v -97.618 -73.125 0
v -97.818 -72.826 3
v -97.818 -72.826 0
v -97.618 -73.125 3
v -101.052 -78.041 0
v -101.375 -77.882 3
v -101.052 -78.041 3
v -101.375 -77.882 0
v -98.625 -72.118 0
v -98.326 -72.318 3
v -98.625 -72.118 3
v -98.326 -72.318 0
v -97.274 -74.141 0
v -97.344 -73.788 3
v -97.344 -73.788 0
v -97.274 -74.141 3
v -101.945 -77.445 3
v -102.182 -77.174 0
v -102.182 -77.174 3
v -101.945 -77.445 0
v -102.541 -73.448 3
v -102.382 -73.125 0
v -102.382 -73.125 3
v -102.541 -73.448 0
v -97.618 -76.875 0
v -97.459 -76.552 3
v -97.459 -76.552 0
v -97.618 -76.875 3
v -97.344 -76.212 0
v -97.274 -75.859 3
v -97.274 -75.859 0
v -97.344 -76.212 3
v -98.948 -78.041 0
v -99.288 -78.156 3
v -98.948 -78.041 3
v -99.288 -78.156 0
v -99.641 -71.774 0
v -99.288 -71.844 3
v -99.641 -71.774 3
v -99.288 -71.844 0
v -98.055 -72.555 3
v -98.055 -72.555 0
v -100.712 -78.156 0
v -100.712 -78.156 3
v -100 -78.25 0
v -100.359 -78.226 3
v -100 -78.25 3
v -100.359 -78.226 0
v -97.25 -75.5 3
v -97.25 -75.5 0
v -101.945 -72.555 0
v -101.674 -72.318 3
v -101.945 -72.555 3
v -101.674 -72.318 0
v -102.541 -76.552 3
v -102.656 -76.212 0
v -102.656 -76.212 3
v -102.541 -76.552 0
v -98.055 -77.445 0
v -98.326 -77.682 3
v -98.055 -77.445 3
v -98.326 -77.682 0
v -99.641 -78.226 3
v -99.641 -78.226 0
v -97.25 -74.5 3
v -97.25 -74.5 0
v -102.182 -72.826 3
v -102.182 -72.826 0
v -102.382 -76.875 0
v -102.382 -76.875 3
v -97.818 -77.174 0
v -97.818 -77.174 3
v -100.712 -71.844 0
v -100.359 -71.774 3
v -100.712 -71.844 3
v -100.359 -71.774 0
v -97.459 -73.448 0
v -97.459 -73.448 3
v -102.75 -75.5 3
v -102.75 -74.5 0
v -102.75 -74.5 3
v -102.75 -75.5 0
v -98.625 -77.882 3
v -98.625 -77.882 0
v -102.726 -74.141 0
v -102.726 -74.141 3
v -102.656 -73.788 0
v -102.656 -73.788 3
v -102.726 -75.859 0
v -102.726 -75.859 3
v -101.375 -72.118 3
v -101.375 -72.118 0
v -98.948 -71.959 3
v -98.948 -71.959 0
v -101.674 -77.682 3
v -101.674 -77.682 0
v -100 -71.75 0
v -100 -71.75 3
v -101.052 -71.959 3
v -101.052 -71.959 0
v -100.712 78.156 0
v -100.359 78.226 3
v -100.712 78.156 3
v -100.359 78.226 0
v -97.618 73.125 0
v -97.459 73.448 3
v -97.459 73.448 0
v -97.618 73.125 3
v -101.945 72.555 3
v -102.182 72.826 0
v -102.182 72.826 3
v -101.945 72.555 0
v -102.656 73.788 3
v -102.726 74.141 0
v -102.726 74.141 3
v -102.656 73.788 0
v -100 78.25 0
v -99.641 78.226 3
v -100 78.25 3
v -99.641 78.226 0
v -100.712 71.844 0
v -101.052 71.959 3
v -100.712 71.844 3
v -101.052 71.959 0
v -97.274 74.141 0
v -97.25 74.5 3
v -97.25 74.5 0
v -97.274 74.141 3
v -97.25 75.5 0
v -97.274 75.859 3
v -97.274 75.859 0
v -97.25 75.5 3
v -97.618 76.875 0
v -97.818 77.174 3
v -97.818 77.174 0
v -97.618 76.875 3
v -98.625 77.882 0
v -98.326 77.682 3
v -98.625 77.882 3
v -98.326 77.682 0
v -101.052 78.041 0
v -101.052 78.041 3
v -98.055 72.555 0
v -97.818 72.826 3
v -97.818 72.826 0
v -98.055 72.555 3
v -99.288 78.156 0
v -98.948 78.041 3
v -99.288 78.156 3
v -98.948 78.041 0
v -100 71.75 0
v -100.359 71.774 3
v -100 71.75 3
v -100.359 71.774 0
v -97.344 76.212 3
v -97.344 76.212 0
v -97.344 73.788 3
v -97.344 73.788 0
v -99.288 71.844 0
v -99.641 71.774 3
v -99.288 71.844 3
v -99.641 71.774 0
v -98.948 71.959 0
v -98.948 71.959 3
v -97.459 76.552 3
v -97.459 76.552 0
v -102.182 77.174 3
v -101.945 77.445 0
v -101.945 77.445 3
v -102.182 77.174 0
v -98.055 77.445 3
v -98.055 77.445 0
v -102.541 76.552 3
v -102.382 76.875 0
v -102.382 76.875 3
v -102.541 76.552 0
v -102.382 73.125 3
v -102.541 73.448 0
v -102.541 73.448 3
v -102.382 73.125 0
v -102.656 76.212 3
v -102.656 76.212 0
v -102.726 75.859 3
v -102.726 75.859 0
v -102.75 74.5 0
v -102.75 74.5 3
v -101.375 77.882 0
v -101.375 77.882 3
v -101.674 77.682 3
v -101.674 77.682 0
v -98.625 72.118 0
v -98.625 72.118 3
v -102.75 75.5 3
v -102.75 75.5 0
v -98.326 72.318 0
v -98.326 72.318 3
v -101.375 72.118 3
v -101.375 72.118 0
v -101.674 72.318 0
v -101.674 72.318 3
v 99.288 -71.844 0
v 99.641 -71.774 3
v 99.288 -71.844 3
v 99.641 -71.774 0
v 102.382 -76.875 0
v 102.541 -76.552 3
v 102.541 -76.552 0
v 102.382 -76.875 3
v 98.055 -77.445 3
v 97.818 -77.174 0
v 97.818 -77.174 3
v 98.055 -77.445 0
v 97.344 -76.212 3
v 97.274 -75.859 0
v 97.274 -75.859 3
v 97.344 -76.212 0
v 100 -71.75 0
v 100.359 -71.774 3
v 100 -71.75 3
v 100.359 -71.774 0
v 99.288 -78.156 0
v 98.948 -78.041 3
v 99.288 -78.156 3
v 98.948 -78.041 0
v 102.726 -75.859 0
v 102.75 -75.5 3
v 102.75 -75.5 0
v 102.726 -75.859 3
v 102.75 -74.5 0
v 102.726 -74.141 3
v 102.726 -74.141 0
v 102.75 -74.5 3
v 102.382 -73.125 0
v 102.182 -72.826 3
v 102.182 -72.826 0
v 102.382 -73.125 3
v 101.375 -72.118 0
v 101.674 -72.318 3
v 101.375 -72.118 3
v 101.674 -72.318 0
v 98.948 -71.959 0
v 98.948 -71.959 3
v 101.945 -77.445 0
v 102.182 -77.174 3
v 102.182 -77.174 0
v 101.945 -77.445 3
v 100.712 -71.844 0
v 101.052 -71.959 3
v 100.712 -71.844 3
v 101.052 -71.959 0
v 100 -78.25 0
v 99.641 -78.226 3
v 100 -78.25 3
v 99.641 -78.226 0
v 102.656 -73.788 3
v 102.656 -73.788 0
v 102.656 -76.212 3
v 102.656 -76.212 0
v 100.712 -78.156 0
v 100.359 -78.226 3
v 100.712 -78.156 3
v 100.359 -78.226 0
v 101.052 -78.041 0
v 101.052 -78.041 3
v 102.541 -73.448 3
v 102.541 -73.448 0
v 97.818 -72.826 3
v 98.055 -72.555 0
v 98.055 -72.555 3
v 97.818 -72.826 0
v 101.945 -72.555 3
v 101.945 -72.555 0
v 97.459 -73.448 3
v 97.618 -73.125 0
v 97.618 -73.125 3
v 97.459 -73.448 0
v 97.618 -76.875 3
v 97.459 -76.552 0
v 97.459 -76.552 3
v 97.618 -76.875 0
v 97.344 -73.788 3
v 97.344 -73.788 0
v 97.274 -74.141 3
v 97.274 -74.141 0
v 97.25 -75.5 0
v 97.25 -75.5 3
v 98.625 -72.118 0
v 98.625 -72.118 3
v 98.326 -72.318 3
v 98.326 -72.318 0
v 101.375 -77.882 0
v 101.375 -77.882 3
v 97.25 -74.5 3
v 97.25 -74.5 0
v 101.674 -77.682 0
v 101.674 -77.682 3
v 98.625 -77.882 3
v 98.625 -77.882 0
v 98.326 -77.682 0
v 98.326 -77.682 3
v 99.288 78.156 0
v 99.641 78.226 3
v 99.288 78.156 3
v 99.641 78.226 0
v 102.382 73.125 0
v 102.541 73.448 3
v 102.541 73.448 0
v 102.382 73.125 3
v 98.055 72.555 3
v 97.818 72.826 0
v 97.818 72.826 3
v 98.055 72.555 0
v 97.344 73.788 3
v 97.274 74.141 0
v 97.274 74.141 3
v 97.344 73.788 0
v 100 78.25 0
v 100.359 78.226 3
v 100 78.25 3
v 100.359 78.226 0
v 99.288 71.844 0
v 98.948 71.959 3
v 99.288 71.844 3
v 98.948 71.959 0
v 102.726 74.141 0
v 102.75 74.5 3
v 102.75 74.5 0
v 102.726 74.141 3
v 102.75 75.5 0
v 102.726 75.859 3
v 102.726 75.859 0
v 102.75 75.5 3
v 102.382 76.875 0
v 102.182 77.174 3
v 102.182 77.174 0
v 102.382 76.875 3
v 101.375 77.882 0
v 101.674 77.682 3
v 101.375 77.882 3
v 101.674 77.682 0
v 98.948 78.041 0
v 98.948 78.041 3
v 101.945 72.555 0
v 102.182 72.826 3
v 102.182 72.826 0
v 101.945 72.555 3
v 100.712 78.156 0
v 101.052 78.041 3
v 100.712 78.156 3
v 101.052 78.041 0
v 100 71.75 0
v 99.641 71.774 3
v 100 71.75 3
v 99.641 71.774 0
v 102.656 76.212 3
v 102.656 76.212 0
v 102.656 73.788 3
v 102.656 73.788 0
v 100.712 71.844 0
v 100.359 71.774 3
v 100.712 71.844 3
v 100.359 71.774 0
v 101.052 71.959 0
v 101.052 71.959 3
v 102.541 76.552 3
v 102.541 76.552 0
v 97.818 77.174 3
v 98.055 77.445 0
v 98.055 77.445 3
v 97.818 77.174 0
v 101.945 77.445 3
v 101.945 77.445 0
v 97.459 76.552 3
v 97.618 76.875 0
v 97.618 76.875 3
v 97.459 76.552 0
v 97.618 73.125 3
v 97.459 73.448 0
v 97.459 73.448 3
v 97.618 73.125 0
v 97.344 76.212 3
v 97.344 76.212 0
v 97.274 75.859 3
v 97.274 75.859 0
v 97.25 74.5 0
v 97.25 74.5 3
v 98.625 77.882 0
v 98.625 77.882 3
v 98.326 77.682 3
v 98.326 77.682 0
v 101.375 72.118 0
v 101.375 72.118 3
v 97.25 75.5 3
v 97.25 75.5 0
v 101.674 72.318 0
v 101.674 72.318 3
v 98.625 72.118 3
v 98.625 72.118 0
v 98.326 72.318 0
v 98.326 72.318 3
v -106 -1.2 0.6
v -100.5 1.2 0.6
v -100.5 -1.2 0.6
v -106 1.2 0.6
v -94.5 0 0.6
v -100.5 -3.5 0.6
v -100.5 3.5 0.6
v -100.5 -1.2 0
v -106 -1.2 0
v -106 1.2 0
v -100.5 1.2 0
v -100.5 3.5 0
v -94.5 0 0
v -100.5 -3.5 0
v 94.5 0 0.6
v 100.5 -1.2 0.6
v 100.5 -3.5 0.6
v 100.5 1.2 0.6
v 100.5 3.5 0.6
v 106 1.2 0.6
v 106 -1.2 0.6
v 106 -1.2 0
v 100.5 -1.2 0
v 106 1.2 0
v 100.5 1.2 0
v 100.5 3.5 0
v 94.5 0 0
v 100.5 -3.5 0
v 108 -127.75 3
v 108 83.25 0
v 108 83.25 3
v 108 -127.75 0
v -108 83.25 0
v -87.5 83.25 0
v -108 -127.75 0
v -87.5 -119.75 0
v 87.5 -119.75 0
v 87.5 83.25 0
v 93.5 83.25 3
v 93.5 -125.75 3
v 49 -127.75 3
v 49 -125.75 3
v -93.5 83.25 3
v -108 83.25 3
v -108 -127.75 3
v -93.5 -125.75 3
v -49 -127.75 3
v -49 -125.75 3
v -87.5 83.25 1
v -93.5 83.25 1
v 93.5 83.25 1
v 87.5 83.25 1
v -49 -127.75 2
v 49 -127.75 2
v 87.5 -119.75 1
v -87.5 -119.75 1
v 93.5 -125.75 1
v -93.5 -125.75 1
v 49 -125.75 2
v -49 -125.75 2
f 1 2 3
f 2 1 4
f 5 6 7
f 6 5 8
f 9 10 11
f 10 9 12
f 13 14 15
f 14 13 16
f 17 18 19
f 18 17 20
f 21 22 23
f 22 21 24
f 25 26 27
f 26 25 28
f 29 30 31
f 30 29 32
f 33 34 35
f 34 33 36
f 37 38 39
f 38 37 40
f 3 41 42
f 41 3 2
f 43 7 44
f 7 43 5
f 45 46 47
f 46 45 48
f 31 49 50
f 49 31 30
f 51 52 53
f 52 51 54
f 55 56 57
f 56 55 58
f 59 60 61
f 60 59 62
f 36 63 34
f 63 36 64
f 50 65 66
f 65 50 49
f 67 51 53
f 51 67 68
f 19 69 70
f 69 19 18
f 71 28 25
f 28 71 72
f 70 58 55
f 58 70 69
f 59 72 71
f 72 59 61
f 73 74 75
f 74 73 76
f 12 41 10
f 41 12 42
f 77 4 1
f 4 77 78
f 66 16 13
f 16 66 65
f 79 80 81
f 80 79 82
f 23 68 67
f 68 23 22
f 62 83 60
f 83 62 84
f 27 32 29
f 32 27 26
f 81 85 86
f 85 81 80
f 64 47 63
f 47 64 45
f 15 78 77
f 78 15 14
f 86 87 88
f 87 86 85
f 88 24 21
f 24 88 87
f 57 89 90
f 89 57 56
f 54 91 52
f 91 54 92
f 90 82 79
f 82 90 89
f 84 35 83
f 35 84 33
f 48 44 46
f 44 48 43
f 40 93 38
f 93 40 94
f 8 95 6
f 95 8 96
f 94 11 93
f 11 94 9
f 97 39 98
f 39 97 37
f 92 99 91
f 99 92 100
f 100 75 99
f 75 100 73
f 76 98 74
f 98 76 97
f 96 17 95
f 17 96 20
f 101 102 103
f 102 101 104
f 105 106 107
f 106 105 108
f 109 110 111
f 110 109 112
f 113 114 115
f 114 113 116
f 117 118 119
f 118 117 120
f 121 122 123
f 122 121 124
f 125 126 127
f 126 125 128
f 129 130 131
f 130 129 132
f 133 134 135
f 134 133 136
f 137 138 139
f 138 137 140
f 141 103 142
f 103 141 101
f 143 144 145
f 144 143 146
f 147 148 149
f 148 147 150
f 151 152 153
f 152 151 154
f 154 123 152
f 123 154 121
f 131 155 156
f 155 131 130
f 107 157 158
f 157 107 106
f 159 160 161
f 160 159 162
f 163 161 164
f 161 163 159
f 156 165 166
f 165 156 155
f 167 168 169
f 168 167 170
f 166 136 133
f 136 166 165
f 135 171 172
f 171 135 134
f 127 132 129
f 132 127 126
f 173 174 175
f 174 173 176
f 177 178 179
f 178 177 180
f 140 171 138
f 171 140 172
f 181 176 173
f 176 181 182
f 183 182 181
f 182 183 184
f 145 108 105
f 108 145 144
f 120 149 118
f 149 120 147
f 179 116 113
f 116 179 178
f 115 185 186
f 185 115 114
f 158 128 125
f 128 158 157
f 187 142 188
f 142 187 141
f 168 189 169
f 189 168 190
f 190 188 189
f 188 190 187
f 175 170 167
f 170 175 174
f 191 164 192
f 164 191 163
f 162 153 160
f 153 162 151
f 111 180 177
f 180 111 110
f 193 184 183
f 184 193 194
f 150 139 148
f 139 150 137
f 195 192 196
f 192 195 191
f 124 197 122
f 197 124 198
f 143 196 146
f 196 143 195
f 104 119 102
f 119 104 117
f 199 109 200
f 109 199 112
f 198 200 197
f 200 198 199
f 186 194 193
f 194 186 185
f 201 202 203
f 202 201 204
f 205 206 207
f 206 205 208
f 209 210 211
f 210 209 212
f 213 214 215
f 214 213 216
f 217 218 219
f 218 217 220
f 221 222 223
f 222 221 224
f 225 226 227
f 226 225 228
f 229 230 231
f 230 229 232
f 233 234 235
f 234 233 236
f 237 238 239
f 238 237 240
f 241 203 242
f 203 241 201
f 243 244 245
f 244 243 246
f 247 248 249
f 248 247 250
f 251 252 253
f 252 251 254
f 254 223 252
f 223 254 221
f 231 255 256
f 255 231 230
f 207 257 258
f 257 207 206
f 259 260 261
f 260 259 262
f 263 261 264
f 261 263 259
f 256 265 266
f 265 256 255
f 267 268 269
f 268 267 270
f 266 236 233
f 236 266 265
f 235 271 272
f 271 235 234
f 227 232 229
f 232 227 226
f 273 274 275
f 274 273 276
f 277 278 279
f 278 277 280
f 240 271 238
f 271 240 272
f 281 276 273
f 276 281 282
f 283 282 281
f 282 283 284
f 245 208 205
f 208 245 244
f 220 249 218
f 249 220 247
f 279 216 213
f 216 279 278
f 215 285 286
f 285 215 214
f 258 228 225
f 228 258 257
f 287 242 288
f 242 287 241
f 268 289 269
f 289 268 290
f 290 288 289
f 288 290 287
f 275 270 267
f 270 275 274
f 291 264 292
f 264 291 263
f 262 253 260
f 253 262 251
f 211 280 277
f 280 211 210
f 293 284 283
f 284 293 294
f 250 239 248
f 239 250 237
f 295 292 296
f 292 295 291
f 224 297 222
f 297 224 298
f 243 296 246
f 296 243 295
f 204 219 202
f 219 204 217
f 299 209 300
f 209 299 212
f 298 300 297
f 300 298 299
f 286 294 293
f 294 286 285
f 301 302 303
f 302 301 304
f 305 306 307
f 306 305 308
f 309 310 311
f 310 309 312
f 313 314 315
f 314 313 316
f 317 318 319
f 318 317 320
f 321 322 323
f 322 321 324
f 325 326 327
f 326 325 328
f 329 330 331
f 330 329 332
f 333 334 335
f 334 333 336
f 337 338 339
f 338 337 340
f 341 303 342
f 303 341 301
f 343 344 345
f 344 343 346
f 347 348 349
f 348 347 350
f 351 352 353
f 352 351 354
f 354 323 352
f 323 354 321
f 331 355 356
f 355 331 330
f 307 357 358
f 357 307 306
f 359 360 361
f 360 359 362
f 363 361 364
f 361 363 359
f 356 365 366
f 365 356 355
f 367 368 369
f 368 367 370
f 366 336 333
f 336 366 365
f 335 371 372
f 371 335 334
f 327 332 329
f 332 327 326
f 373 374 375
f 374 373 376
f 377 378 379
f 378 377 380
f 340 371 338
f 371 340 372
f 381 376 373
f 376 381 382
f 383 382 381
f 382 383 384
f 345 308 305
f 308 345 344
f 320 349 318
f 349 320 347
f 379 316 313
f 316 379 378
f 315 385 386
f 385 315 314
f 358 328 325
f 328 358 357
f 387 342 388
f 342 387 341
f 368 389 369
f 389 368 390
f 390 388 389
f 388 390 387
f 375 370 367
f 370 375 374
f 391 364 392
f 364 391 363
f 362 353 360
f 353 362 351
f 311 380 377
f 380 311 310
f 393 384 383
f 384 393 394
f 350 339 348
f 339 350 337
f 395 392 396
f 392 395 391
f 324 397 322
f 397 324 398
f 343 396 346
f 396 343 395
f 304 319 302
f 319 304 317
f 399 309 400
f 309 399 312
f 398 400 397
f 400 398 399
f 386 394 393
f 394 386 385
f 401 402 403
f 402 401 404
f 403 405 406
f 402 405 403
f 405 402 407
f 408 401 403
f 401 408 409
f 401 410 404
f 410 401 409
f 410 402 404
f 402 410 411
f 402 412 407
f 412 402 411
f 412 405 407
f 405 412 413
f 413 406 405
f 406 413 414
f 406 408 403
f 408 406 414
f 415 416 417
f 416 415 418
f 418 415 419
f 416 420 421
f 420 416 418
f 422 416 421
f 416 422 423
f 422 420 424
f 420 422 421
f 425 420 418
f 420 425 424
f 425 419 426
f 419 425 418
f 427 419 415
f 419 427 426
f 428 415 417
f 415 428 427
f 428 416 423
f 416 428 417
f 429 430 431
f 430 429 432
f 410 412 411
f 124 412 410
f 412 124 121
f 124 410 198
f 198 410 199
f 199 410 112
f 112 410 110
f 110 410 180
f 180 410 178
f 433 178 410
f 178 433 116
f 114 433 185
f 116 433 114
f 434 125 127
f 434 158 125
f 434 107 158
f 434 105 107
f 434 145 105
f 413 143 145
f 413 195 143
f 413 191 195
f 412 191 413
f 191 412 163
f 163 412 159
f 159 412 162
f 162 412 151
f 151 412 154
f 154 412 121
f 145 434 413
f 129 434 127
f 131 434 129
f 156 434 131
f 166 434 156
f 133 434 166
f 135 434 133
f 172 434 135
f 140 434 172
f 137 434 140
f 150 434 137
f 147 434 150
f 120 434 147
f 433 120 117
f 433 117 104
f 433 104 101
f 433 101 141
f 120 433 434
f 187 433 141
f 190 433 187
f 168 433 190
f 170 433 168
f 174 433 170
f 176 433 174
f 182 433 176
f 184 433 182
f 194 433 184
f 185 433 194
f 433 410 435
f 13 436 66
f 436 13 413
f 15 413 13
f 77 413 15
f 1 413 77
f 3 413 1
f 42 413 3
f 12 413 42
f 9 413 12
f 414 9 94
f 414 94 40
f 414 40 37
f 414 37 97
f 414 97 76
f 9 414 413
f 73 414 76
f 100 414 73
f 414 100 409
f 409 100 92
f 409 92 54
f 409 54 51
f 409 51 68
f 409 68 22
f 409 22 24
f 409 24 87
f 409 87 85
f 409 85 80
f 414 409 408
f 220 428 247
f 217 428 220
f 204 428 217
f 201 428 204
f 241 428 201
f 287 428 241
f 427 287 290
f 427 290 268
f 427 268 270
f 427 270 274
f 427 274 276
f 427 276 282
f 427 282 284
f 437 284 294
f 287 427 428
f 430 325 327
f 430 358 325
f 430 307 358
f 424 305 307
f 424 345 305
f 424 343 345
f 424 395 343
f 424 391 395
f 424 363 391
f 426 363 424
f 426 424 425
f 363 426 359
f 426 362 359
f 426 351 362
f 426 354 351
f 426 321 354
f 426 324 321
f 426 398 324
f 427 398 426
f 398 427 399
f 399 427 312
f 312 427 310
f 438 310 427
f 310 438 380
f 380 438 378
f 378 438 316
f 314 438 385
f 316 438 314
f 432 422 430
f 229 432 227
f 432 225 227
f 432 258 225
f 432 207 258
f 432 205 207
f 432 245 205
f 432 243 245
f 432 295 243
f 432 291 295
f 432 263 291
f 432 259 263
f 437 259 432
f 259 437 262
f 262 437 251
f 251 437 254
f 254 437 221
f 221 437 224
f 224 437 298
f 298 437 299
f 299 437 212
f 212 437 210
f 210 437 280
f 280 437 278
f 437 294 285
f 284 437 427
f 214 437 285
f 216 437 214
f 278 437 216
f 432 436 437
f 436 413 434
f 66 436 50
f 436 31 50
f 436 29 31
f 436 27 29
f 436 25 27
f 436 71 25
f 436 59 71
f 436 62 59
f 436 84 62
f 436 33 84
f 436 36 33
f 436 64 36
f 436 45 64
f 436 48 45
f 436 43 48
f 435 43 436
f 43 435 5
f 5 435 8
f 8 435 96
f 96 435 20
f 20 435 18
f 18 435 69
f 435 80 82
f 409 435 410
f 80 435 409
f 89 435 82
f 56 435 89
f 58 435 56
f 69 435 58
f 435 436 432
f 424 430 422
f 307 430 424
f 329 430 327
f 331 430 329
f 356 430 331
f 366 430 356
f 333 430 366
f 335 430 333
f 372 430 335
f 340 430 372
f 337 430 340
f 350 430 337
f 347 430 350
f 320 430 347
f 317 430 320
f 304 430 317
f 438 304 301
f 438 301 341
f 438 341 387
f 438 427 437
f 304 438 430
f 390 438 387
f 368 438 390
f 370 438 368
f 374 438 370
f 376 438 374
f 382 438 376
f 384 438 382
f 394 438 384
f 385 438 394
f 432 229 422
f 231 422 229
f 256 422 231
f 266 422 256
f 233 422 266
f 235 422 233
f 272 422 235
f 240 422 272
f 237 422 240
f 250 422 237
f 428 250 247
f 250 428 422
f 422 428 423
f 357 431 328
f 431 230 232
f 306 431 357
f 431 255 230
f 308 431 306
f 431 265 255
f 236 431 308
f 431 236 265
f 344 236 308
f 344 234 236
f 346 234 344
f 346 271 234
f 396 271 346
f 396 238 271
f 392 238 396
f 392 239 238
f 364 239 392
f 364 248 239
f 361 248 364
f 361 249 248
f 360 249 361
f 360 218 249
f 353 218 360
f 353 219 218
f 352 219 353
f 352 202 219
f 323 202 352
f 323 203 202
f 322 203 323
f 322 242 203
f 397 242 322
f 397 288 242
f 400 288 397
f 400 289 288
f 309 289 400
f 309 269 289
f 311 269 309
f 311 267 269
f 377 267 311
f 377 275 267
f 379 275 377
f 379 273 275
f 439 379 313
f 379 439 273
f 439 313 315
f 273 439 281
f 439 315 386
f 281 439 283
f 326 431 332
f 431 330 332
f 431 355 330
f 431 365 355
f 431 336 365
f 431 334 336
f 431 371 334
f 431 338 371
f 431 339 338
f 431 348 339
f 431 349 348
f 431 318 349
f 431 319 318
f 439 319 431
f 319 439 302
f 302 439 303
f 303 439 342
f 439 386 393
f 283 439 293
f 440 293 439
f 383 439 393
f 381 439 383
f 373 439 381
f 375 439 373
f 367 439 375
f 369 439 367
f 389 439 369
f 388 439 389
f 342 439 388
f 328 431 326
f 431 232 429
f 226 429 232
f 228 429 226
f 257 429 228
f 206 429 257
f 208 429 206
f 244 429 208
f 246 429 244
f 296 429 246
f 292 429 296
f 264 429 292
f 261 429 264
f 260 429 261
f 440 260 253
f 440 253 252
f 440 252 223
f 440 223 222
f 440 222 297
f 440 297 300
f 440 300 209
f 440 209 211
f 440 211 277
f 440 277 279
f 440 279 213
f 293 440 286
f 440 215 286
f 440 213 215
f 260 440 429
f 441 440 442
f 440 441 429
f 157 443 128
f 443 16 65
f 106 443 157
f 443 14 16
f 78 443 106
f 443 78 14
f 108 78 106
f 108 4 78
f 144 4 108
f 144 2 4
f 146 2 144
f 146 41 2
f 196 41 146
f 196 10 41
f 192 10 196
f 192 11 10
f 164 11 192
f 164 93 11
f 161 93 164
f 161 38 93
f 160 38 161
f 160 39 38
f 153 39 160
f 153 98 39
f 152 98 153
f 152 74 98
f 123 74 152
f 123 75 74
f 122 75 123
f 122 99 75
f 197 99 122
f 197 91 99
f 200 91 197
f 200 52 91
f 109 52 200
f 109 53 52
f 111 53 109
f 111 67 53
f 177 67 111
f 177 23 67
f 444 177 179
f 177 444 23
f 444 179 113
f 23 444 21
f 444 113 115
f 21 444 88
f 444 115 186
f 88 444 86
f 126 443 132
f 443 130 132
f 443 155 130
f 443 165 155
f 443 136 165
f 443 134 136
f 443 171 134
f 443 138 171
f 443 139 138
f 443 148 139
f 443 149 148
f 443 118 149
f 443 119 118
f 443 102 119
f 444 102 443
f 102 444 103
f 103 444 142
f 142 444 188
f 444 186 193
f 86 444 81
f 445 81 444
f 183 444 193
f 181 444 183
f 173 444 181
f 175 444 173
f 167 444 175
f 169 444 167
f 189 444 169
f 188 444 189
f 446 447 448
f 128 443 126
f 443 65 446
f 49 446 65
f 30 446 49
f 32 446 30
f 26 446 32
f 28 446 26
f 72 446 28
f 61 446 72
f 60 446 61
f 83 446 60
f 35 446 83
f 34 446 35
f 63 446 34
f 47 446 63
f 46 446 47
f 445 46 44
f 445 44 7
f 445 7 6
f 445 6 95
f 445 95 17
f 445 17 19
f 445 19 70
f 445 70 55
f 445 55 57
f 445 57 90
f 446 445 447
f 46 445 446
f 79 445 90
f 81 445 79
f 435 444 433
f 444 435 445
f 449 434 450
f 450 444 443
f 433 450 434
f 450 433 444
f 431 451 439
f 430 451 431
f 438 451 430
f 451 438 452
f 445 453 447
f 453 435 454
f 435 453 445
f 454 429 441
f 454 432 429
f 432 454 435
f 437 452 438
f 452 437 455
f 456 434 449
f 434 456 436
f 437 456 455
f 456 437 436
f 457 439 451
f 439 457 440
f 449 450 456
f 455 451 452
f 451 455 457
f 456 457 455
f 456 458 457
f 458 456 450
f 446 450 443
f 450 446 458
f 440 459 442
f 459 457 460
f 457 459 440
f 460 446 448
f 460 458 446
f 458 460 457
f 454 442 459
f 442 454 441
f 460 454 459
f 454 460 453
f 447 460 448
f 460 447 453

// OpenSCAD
// freETarget rifle mask holder for a 185 x 229 mm (7.25" x 9") paper mask.
// The mask's 30.5 mm hole sits concentric with the faceplate hole; the witness paper
// runs top to bottom between the mask and the faceplate and leaves under the crossbar.
// The legs stop just above the top screws, so a mask can be fed in from the top.
// Mounts on the faceplate's 4 screws (Rifle Face Plate.dxf / FET-016: dia 5 mm holes at
// x = +-100, y = +74.5 / -75.5 from the hole centre). Pocket and notch copy
// "Rifle Target Holder v17": 3 mm thick, 2 mm pocket, 98 x 1 mm witness-paper notch.
// Two arrows recessed in the front face mark the horizontal centre line of the mask hole.
//
// Axes: origin = faceplate hole centre, X right, Y up (crossbar at the bottom),
//       Z = 0 on the back face (against the faceplate), Z = T on the front.
// Build the STLs with ../build-stls.sh.

PIECE        = "whole";   // "whole" (one piece), "bar", "left", "right", "assembly"
PRINT_LAYOUT = true;      // front face down on the bed

// ---- paper mask ----
PAPER_W  = 185;
PAPER_H  = 229;
HOLE_D   = 30.5;
HOLE_TOP = 89;                       // top of the mask hole, from the top of the paper
AIM_FROM_TOP = HOLE_TOP + HOLE_D/2;  // 104.25

// ---- pocket and notch (same as Rifle Target Holder v17) ----
T         = 3;      // overall thickness
POCKET_D  = 2;      // mask + witness paper pocket, from the back
PAPER_CLR = 1;      // pocket clearance around the mask, each side
NOTCH_W   = 98;     // witness-paper notch under the crossbar
NOTCH_D   = 1;

// ---- frame ----
LIP        = 5;     // frame overlaps the mask edge by this much (sides and bottom)
BAR_BELOW  = 2;     // full-thickness strip below the pocket (was 12; 10 mm removed so the
                    // crossbar clears the paper-feed frame)
HEAD_D     = 9.5;   // screw head diameter (M5 pan head, 3 mm hex socket)
TOP_EDGE   = 3;     // plastic left above the screw head; the legs stop here so a mask can be
                    // fed in from the top past the target's paper guide (the mask top is not held)
OUTER_X    = 108;   // half width

// ---- faceplate screws ----
BOLT_X    = 100;
BOLT_Y    = 75;     // slot centre; the 1 mm slot covers +74.5 / -75.5 either way up
BOLT_SLOT = 1;
BOLT_D    = 5.5;    // M5 clearance (3 mm hex socket pan heads); was 5.0

// ---- centre-line arrows (front face) ----
ARROW_DEPTH = 0.6;  // recessed: 3 layers at 0.2 mm
ARROW_TIP   = 1;    // tip this far outside the pocket edge (full-thickness part of the leg)
ARROW_HEAD_L = 6;
ARROW_HEAD_W = 7;
ARROW_TAIL_L = 5.5;
ARROW_TAIL_W = 2.4;

// ---- split version ----
SPLIT_Y  = -60;     // legs and crossbar part here, between the screws
DT_NECK  = 4.5;     // dovetail neck width
DT_HEAD  = 7;       // dovetail head width
DT_DEPTH = 6;       // how far the tongue reaches into the leg
FIT      = 0.15;    // clearance on the socket and the joint

// ---- derived ----
PAPER_TOP = AIM_FROM_TOP;
PAPER_BOT = AIM_FROM_TOP - PAPER_H;          // -124.75
PK_X   = PAPER_W/2 + PAPER_CLR;              // 93.5
PK_BOT = PAPER_BOT - PAPER_CLR;              // -125.75
WIN_X  = PAPER_W/2 - LIP;                    // 87.5
WIN_BOT = PAPER_BOT + LIP;                   // -119.75
TOP_Y  = BOLT_Y + BOLT_SLOT/2 + HEAD_D/2 + TOP_EDGE;   // 83.25
BOT_Y  = PK_BOT - BAR_BELOW;                 // -127.75
DT_X   = (PK_X + OUTER_X) / 2;               // centre of the full-thickness part of the leg

module arrow2d() {                           // right-hand arrow, pointing toward the centre
    tip = PK_X + ARROW_TIP;
    polygon([[tip, 0], [tip + ARROW_HEAD_L, ARROW_HEAD_W/2], [tip + ARROW_HEAD_L, -ARROW_HEAD_W/2]]);
    translate([tip + ARROW_HEAD_L - 0.5, -ARROW_TAIL_W/2]) square([ARROW_TAIL_L + 0.5, ARROW_TAIL_W]);
}

module body() difference() {
    translate([-OUTER_X, BOT_Y, 0]) cube([2*OUTER_X, TOP_Y - BOT_Y, T]);
    // window (open at the top)
    translate([-WIN_X, WIN_BOT, -1]) cube([2*WIN_X, TOP_Y - WIN_BOT + 1, T + 2]);
    // mask + witness-paper pocket from the back (open at the top)
    translate([-PK_X, PK_BOT, -1]) cube([2*PK_X, TOP_Y - PK_BOT + 1, POCKET_D + 1]);
    // witness-paper notch under the crossbar
    translate([-NOTCH_W/2, BOT_Y - 1, -1]) cube([NOTCH_W, PK_BOT - BOT_Y + 1.01, NOTCH_D + 1]);
    // faceplate screw slots
    for (sx = [-1, 1], sy = [-1, 1])
        translate([sx*BOLT_X, sy*BOLT_Y, -1])
            hull() for (d = [-BOLT_SLOT/2, BOLT_SLOT/2])
                translate([0, d, 0]) cylinder(d = BOLT_D, h = T + 2, $fn = 48);
    // centre-line arrows, recessed into the front face
    for (s = [-1, 1]) scale([s, 1, 1])
        translate([0, 0, T - ARROW_DEPTH]) linear_extrude(ARROW_DEPTH + 1) arrow2d();
}

module tongue2d() polygon([                  // right-hand tongue, pointing up into the leg
    [DT_X - DT_NECK/2, SPLIT_Y - 1],
    [DT_X - DT_NECK/2, SPLIT_Y],
    [DT_X - DT_HEAD/2, SPLIT_Y + DT_DEPTH],
    [DT_X + DT_HEAD/2, SPLIT_Y + DT_DEPTH],
    [DT_X + DT_NECK/2, SPLIT_Y],
    [DT_X + DT_NECK/2, SPLIT_Y - 1]]);

module tongues(grow = 0)
    for (s = [-1, 1]) scale([s, 1, 1])
        translate([0, 0, -1]) linear_extrude(T + 2) offset(delta = grow) tongue2d();

module bar() intersection() {                // crossbar with the lower legs and both lower screws
    body();
    union() {
        translate([-OUTER_X - 1, BOT_Y - 1, -1]) cube([2*OUTER_X + 2, SPLIT_Y - BOT_Y + 1, T + 2]);
        tongues(0);
    }
}

module right_leg() difference() {            // upper right leg with its screw
    intersection() {
        body();
        translate([0, SPLIT_Y + FIT, -1]) cube([OUTER_X + 1, TOP_Y - SPLIT_Y, T + 2]);
    }
    tongues(FIT);
}

module left_leg() mirror([1, 0, 0]) right_leg();

module laid() {
    if (PRINT_LAYOUT) translate([0, 0, T]) mirror([0, 0, 1]) children();
    else children();
}

if      (PIECE == "whole")    laid() body();
else if (PIECE == "bar")      laid() bar();
else if (PIECE == "right")    laid() right_leg();
else if (PIECE == "left")     laid() left_leg();
else if (PIECE == "assembly") { bar(); right_leg(); left_leg(); }
